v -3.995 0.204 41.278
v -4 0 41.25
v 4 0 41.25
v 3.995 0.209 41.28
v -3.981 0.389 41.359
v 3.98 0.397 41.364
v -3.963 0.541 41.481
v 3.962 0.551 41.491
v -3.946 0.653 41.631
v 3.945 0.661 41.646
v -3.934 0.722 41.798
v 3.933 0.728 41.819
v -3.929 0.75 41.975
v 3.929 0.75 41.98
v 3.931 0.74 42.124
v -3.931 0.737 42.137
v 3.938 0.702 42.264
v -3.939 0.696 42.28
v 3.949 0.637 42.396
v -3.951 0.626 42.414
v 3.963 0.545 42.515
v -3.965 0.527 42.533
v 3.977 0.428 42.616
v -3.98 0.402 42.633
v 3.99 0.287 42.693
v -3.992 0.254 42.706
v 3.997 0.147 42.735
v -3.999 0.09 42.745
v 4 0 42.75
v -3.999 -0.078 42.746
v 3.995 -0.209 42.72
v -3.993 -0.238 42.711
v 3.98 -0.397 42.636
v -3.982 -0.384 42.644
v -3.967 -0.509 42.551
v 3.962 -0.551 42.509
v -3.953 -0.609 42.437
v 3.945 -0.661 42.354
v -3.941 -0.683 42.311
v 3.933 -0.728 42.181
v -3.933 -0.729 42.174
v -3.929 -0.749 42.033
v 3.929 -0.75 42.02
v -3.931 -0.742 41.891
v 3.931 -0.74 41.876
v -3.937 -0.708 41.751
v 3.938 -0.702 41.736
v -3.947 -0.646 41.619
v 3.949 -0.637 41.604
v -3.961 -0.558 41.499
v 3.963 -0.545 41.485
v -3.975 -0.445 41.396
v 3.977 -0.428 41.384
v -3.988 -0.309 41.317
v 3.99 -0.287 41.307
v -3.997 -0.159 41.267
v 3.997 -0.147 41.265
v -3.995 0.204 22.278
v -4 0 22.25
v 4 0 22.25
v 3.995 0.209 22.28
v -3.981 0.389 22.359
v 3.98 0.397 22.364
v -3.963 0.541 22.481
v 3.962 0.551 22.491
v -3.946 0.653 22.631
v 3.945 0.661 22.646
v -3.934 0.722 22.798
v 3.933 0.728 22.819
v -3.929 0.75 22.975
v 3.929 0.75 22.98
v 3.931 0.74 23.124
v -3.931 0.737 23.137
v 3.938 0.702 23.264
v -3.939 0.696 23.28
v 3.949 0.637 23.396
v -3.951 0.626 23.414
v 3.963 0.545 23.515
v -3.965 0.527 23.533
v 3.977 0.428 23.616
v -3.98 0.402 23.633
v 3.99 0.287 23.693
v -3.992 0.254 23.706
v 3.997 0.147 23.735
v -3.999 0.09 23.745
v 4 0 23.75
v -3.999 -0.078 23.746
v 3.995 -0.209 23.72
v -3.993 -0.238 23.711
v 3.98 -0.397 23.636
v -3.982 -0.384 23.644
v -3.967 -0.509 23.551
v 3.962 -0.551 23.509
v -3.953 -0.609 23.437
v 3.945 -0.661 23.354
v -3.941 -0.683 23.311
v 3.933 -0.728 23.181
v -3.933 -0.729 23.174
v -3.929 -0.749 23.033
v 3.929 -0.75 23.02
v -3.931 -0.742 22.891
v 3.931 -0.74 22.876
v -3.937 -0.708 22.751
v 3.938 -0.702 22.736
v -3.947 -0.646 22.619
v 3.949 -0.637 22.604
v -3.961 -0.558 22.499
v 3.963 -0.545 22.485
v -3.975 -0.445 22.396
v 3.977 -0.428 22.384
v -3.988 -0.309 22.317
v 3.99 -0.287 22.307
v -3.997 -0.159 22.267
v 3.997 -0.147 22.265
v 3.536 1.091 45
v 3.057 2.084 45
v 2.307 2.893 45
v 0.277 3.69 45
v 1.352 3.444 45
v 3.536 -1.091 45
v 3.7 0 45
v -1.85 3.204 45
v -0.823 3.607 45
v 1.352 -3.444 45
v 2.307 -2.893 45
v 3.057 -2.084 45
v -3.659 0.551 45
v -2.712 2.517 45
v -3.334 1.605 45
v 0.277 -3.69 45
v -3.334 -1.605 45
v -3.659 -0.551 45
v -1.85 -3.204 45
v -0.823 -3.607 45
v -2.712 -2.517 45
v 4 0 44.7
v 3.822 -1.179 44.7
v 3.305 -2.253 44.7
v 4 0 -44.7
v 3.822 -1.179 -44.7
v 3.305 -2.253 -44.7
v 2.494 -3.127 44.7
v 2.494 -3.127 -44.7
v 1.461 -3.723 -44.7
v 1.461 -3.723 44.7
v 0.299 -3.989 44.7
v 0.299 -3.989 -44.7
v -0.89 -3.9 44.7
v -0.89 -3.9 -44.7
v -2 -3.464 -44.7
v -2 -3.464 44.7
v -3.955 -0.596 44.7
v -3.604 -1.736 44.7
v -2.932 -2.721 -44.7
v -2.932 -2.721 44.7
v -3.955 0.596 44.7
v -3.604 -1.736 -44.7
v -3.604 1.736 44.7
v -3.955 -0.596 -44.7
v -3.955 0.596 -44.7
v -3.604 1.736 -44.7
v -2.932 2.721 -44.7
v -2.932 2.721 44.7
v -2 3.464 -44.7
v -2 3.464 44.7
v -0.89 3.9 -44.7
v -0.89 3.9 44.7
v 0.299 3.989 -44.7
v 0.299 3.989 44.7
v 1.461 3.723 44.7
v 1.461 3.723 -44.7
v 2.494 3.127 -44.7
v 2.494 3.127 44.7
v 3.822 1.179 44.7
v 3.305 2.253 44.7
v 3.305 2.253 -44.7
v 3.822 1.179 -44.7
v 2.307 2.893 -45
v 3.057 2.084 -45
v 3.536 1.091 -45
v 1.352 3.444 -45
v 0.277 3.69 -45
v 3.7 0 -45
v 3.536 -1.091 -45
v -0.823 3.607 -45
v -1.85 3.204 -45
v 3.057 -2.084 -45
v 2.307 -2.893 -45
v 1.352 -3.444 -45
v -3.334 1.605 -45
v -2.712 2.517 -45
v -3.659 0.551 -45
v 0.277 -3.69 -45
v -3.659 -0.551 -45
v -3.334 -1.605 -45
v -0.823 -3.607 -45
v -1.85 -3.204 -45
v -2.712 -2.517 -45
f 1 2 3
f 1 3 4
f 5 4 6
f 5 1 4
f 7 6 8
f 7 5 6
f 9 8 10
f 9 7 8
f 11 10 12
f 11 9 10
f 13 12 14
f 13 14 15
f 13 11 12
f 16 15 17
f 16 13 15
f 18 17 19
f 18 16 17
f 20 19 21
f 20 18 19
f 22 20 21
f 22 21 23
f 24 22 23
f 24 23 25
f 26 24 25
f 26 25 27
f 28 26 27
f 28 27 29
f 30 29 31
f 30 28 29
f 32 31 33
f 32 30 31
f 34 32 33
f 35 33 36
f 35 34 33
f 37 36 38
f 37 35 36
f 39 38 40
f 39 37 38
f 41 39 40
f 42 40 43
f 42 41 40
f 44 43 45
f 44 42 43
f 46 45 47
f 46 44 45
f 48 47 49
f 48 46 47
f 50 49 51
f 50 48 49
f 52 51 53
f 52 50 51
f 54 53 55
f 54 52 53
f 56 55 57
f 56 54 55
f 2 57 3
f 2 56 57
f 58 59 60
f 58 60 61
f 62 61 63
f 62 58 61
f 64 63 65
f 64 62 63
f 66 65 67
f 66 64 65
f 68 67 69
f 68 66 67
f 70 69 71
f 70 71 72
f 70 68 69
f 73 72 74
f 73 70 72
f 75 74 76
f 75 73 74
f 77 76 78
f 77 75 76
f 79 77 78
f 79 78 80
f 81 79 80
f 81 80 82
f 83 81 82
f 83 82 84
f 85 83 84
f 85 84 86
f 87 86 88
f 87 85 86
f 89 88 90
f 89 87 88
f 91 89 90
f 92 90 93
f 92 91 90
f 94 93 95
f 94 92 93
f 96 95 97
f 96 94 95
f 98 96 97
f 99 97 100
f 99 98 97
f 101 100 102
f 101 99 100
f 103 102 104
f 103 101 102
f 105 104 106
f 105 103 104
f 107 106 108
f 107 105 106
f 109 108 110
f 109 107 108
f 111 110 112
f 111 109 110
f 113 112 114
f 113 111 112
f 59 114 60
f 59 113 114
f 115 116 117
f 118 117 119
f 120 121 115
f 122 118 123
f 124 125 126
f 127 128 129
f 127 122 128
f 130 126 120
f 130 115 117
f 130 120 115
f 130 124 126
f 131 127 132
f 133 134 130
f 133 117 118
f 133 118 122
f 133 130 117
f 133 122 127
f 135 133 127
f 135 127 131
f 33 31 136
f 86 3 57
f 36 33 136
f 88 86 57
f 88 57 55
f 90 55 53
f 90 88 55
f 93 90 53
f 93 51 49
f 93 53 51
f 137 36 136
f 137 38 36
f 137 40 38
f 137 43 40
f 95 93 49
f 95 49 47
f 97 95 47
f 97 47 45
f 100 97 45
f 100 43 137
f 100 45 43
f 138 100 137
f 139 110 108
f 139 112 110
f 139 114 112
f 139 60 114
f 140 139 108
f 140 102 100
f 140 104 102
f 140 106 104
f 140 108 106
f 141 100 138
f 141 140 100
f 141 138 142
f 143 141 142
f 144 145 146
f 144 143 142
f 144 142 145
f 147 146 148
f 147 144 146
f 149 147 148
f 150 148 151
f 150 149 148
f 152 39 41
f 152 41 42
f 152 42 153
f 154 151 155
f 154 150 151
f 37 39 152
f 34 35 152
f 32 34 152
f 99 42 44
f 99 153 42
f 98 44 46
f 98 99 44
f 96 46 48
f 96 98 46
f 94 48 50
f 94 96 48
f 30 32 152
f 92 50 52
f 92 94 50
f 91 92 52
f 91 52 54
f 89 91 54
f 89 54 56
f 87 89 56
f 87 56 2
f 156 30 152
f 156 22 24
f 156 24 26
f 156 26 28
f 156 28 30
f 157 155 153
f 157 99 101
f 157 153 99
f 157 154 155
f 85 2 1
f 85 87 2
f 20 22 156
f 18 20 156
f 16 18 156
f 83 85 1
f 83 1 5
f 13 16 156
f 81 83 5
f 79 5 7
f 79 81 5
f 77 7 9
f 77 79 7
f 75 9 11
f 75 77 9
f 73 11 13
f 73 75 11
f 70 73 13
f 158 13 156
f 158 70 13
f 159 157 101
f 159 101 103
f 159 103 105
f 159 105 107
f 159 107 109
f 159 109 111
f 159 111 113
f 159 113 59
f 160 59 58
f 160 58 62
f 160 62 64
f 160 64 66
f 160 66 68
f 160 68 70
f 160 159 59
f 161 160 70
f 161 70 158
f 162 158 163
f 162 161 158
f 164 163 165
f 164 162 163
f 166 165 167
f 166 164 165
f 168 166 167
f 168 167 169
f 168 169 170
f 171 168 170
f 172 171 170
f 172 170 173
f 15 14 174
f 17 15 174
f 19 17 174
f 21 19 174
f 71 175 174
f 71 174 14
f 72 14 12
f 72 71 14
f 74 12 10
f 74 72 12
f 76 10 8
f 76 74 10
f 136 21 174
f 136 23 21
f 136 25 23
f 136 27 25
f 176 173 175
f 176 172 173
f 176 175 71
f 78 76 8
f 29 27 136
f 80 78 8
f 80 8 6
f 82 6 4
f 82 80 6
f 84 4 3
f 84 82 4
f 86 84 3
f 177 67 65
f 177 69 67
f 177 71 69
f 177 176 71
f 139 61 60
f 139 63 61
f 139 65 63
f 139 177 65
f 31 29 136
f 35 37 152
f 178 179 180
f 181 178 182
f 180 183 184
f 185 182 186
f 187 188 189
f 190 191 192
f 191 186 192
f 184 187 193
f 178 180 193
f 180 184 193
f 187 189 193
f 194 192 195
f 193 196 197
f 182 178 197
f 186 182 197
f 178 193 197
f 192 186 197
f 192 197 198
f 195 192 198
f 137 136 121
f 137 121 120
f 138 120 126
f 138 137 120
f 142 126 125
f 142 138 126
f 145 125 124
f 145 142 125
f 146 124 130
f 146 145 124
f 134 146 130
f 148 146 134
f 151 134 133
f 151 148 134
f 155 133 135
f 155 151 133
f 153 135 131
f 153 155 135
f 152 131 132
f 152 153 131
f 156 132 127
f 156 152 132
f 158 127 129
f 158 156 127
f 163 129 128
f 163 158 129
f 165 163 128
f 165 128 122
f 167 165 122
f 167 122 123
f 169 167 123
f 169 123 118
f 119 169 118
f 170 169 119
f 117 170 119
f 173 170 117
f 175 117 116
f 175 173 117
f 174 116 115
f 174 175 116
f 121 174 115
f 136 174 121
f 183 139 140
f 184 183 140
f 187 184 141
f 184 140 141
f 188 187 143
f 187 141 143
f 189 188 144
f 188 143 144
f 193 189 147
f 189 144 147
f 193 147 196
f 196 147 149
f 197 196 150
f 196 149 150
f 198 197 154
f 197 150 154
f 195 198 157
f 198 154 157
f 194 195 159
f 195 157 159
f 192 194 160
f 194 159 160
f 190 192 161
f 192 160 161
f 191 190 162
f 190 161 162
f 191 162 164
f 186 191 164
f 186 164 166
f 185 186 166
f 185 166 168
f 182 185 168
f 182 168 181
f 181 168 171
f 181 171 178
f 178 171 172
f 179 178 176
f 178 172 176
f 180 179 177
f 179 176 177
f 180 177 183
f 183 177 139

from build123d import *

# Parameters (mm, degrees)
SKETCH1_W               = 90
SKETCH1_H               = 4
CHAMFER1_SIZE           = 0.3
CUT_EXTRUDE1_DEPTH      = 46.354161882
CUT_EXTRUDE1_DEPTH_BACK = 46.354161882
SKETCH6_R               = 0.75


with BuildPart() as part:
    # Sketch1 → Revolve1 (revolve)
    with BuildSketch(Plane(origin=(0, 0, 0), x_dir=(0, 0, -1), z_dir=(1, 0, 0)), mode=Mode.PRIVATE) as revolve1_sk:
        with Locations((0, 2)):
            Rectangle(SKETCH1_W, SKETCH1_H)
    revolve(revolve1_sk.sketch.rotate(Axis((0, 0, 0), (0, 0, -1)), 90), axis=Axis((0, 0, 0), (0, 0, -1)))

    # Chamfer1
    chamfer1_edges = [part.edges().sort_by_distance(p)[0] for p in [
        (-4, 0, 45),
        (-4, 0, -45),
    ]]
    chamfer(chamfer1_edges, length=CHAMFER1_SIZE)

    # Sketch6 → Cut-Extrude1 (cut, two sides: drawn at the far end of the back side and taken through both)
    with BuildSketch(Plane(origin=(0, 0, 0), x_dir=(0, 0, -1), z_dir=(1, 0, 0)).offset(-CUT_EXTRUDE1_DEPTH_BACK)):
        with Locations((-23, 0)):
            Circle(SKETCH6_R)
        with Locations((-42, 0)):
            Circle(SKETCH6_R)
    extrude(amount=CUT_EXTRUDE1_DEPTH + CUT_EXTRUDE1_DEPTH_BACK, mode=Mode.SUBTRACT)


solid = part.part
